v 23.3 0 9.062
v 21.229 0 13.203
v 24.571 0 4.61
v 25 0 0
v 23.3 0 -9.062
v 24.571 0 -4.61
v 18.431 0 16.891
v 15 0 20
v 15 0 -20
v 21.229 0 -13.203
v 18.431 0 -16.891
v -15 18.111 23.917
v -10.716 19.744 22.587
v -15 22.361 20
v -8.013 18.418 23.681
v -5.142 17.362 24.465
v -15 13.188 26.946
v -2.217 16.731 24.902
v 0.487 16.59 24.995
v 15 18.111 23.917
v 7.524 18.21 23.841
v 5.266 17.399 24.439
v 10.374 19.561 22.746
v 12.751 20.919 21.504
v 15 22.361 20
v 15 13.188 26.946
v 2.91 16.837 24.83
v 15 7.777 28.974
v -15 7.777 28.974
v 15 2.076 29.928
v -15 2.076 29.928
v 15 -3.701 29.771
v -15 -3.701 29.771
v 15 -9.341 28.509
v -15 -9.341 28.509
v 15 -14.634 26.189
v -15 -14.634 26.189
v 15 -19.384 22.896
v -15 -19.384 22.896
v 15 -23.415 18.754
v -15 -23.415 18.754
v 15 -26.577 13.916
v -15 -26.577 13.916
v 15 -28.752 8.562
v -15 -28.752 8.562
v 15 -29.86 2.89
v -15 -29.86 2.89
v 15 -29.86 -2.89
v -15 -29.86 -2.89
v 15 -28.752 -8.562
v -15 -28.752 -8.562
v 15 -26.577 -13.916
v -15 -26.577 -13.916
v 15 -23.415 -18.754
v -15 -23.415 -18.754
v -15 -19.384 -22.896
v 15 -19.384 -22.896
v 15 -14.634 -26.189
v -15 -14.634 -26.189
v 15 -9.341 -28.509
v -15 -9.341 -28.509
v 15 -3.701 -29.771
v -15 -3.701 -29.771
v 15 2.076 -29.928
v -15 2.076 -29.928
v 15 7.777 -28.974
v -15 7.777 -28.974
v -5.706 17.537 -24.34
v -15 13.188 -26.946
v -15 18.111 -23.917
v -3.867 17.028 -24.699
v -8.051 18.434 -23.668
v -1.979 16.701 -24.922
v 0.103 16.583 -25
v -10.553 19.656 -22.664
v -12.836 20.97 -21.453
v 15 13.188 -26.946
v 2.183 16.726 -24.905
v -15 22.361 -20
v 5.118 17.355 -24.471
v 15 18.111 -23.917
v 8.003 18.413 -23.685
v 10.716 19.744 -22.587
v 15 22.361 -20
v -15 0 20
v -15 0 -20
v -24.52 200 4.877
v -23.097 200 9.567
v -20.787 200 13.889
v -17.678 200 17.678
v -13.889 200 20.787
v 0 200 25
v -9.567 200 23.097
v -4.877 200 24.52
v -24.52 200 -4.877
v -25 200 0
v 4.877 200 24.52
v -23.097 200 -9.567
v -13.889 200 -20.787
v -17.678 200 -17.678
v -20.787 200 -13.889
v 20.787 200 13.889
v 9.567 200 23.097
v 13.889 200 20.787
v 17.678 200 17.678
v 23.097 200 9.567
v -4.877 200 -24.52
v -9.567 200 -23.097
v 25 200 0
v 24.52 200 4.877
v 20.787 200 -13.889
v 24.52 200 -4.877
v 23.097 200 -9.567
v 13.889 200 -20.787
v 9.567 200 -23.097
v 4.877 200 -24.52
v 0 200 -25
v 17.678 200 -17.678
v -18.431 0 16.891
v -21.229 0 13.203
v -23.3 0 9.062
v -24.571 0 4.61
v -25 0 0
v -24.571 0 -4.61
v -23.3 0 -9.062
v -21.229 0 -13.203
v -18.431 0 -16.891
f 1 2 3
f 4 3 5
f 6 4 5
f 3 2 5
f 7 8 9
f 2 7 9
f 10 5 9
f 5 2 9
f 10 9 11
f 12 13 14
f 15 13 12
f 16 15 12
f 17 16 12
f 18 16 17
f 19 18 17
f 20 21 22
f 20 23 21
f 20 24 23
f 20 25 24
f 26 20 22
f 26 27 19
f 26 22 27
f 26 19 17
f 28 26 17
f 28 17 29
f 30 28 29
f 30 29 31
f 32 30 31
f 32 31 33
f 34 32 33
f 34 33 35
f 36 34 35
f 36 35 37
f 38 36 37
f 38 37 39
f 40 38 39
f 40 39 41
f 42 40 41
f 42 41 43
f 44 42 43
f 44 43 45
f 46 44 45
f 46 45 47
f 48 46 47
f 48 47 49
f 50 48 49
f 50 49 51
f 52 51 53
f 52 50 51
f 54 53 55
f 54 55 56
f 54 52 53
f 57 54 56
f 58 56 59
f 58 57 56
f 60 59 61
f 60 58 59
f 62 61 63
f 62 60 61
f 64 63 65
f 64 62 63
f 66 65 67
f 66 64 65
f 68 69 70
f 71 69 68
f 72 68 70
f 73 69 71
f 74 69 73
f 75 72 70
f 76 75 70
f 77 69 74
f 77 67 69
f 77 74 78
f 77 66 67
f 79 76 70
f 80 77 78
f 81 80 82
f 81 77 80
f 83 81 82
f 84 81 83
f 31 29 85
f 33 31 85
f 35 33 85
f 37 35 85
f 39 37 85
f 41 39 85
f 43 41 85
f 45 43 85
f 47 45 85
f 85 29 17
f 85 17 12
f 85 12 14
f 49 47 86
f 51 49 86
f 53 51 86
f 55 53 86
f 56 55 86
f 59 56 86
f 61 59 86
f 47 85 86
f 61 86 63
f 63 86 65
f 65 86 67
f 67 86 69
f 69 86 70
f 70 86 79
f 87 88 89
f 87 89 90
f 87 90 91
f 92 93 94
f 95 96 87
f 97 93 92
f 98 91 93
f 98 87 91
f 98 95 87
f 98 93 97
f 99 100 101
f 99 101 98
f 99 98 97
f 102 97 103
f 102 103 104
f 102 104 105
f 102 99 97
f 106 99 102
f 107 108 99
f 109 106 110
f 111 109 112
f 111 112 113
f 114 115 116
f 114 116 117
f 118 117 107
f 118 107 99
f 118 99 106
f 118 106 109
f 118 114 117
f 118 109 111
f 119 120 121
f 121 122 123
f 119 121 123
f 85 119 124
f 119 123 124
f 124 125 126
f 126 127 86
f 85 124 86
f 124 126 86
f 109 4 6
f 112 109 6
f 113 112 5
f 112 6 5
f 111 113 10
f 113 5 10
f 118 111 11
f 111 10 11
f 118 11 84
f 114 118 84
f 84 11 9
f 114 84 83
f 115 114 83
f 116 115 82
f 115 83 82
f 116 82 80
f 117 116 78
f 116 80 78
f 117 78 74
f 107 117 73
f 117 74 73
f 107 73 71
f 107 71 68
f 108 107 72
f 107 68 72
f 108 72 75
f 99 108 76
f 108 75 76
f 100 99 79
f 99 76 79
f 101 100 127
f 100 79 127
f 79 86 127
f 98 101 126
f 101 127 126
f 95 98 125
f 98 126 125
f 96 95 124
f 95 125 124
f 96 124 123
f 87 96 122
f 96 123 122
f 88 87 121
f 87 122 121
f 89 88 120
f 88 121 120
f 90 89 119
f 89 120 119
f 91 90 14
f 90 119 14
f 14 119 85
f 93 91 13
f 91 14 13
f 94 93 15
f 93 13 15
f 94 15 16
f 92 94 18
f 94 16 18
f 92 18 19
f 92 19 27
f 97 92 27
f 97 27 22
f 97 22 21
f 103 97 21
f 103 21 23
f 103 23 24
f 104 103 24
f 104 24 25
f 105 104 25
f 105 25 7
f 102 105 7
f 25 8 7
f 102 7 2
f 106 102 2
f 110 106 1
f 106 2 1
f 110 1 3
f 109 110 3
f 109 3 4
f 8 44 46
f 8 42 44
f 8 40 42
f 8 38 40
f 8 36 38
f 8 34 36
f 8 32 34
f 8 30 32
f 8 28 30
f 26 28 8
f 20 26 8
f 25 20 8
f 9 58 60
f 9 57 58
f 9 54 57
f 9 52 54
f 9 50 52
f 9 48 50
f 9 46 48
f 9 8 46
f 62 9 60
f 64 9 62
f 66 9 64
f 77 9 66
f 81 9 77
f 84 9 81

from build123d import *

# Parameters (mm, degrees)
SKETCH1_R           = 25
BOSS_EXTRUDE1_DEPTH = 200
SKETCH9_R           = 30
BOSS_EXTRUDE4_DEPTH = 15


with BuildPart() as part:
    # Sketch1 → Boss-Extrude1 (new body)
    with BuildSketch(Plane(origin=(0, 0, 0), x_dir=(1, 0, 0), z_dir=(0, 1, 0))):
        Circle(SKETCH1_R)
    extrude(amount=BOSS_EXTRUDE1_DEPTH)

    # Sketch9 → Boss-Extrude4 (add, symmetric)
    with BuildSketch(Plane(origin=(0, 0, 0), x_dir=(0, 0, -1), z_dir=(1, 0, 0))):
        Circle(SKETCH9_R)
    extrude(amount=BOSS_EXTRUDE4_DEPTH, both=True)


solid = part.part
